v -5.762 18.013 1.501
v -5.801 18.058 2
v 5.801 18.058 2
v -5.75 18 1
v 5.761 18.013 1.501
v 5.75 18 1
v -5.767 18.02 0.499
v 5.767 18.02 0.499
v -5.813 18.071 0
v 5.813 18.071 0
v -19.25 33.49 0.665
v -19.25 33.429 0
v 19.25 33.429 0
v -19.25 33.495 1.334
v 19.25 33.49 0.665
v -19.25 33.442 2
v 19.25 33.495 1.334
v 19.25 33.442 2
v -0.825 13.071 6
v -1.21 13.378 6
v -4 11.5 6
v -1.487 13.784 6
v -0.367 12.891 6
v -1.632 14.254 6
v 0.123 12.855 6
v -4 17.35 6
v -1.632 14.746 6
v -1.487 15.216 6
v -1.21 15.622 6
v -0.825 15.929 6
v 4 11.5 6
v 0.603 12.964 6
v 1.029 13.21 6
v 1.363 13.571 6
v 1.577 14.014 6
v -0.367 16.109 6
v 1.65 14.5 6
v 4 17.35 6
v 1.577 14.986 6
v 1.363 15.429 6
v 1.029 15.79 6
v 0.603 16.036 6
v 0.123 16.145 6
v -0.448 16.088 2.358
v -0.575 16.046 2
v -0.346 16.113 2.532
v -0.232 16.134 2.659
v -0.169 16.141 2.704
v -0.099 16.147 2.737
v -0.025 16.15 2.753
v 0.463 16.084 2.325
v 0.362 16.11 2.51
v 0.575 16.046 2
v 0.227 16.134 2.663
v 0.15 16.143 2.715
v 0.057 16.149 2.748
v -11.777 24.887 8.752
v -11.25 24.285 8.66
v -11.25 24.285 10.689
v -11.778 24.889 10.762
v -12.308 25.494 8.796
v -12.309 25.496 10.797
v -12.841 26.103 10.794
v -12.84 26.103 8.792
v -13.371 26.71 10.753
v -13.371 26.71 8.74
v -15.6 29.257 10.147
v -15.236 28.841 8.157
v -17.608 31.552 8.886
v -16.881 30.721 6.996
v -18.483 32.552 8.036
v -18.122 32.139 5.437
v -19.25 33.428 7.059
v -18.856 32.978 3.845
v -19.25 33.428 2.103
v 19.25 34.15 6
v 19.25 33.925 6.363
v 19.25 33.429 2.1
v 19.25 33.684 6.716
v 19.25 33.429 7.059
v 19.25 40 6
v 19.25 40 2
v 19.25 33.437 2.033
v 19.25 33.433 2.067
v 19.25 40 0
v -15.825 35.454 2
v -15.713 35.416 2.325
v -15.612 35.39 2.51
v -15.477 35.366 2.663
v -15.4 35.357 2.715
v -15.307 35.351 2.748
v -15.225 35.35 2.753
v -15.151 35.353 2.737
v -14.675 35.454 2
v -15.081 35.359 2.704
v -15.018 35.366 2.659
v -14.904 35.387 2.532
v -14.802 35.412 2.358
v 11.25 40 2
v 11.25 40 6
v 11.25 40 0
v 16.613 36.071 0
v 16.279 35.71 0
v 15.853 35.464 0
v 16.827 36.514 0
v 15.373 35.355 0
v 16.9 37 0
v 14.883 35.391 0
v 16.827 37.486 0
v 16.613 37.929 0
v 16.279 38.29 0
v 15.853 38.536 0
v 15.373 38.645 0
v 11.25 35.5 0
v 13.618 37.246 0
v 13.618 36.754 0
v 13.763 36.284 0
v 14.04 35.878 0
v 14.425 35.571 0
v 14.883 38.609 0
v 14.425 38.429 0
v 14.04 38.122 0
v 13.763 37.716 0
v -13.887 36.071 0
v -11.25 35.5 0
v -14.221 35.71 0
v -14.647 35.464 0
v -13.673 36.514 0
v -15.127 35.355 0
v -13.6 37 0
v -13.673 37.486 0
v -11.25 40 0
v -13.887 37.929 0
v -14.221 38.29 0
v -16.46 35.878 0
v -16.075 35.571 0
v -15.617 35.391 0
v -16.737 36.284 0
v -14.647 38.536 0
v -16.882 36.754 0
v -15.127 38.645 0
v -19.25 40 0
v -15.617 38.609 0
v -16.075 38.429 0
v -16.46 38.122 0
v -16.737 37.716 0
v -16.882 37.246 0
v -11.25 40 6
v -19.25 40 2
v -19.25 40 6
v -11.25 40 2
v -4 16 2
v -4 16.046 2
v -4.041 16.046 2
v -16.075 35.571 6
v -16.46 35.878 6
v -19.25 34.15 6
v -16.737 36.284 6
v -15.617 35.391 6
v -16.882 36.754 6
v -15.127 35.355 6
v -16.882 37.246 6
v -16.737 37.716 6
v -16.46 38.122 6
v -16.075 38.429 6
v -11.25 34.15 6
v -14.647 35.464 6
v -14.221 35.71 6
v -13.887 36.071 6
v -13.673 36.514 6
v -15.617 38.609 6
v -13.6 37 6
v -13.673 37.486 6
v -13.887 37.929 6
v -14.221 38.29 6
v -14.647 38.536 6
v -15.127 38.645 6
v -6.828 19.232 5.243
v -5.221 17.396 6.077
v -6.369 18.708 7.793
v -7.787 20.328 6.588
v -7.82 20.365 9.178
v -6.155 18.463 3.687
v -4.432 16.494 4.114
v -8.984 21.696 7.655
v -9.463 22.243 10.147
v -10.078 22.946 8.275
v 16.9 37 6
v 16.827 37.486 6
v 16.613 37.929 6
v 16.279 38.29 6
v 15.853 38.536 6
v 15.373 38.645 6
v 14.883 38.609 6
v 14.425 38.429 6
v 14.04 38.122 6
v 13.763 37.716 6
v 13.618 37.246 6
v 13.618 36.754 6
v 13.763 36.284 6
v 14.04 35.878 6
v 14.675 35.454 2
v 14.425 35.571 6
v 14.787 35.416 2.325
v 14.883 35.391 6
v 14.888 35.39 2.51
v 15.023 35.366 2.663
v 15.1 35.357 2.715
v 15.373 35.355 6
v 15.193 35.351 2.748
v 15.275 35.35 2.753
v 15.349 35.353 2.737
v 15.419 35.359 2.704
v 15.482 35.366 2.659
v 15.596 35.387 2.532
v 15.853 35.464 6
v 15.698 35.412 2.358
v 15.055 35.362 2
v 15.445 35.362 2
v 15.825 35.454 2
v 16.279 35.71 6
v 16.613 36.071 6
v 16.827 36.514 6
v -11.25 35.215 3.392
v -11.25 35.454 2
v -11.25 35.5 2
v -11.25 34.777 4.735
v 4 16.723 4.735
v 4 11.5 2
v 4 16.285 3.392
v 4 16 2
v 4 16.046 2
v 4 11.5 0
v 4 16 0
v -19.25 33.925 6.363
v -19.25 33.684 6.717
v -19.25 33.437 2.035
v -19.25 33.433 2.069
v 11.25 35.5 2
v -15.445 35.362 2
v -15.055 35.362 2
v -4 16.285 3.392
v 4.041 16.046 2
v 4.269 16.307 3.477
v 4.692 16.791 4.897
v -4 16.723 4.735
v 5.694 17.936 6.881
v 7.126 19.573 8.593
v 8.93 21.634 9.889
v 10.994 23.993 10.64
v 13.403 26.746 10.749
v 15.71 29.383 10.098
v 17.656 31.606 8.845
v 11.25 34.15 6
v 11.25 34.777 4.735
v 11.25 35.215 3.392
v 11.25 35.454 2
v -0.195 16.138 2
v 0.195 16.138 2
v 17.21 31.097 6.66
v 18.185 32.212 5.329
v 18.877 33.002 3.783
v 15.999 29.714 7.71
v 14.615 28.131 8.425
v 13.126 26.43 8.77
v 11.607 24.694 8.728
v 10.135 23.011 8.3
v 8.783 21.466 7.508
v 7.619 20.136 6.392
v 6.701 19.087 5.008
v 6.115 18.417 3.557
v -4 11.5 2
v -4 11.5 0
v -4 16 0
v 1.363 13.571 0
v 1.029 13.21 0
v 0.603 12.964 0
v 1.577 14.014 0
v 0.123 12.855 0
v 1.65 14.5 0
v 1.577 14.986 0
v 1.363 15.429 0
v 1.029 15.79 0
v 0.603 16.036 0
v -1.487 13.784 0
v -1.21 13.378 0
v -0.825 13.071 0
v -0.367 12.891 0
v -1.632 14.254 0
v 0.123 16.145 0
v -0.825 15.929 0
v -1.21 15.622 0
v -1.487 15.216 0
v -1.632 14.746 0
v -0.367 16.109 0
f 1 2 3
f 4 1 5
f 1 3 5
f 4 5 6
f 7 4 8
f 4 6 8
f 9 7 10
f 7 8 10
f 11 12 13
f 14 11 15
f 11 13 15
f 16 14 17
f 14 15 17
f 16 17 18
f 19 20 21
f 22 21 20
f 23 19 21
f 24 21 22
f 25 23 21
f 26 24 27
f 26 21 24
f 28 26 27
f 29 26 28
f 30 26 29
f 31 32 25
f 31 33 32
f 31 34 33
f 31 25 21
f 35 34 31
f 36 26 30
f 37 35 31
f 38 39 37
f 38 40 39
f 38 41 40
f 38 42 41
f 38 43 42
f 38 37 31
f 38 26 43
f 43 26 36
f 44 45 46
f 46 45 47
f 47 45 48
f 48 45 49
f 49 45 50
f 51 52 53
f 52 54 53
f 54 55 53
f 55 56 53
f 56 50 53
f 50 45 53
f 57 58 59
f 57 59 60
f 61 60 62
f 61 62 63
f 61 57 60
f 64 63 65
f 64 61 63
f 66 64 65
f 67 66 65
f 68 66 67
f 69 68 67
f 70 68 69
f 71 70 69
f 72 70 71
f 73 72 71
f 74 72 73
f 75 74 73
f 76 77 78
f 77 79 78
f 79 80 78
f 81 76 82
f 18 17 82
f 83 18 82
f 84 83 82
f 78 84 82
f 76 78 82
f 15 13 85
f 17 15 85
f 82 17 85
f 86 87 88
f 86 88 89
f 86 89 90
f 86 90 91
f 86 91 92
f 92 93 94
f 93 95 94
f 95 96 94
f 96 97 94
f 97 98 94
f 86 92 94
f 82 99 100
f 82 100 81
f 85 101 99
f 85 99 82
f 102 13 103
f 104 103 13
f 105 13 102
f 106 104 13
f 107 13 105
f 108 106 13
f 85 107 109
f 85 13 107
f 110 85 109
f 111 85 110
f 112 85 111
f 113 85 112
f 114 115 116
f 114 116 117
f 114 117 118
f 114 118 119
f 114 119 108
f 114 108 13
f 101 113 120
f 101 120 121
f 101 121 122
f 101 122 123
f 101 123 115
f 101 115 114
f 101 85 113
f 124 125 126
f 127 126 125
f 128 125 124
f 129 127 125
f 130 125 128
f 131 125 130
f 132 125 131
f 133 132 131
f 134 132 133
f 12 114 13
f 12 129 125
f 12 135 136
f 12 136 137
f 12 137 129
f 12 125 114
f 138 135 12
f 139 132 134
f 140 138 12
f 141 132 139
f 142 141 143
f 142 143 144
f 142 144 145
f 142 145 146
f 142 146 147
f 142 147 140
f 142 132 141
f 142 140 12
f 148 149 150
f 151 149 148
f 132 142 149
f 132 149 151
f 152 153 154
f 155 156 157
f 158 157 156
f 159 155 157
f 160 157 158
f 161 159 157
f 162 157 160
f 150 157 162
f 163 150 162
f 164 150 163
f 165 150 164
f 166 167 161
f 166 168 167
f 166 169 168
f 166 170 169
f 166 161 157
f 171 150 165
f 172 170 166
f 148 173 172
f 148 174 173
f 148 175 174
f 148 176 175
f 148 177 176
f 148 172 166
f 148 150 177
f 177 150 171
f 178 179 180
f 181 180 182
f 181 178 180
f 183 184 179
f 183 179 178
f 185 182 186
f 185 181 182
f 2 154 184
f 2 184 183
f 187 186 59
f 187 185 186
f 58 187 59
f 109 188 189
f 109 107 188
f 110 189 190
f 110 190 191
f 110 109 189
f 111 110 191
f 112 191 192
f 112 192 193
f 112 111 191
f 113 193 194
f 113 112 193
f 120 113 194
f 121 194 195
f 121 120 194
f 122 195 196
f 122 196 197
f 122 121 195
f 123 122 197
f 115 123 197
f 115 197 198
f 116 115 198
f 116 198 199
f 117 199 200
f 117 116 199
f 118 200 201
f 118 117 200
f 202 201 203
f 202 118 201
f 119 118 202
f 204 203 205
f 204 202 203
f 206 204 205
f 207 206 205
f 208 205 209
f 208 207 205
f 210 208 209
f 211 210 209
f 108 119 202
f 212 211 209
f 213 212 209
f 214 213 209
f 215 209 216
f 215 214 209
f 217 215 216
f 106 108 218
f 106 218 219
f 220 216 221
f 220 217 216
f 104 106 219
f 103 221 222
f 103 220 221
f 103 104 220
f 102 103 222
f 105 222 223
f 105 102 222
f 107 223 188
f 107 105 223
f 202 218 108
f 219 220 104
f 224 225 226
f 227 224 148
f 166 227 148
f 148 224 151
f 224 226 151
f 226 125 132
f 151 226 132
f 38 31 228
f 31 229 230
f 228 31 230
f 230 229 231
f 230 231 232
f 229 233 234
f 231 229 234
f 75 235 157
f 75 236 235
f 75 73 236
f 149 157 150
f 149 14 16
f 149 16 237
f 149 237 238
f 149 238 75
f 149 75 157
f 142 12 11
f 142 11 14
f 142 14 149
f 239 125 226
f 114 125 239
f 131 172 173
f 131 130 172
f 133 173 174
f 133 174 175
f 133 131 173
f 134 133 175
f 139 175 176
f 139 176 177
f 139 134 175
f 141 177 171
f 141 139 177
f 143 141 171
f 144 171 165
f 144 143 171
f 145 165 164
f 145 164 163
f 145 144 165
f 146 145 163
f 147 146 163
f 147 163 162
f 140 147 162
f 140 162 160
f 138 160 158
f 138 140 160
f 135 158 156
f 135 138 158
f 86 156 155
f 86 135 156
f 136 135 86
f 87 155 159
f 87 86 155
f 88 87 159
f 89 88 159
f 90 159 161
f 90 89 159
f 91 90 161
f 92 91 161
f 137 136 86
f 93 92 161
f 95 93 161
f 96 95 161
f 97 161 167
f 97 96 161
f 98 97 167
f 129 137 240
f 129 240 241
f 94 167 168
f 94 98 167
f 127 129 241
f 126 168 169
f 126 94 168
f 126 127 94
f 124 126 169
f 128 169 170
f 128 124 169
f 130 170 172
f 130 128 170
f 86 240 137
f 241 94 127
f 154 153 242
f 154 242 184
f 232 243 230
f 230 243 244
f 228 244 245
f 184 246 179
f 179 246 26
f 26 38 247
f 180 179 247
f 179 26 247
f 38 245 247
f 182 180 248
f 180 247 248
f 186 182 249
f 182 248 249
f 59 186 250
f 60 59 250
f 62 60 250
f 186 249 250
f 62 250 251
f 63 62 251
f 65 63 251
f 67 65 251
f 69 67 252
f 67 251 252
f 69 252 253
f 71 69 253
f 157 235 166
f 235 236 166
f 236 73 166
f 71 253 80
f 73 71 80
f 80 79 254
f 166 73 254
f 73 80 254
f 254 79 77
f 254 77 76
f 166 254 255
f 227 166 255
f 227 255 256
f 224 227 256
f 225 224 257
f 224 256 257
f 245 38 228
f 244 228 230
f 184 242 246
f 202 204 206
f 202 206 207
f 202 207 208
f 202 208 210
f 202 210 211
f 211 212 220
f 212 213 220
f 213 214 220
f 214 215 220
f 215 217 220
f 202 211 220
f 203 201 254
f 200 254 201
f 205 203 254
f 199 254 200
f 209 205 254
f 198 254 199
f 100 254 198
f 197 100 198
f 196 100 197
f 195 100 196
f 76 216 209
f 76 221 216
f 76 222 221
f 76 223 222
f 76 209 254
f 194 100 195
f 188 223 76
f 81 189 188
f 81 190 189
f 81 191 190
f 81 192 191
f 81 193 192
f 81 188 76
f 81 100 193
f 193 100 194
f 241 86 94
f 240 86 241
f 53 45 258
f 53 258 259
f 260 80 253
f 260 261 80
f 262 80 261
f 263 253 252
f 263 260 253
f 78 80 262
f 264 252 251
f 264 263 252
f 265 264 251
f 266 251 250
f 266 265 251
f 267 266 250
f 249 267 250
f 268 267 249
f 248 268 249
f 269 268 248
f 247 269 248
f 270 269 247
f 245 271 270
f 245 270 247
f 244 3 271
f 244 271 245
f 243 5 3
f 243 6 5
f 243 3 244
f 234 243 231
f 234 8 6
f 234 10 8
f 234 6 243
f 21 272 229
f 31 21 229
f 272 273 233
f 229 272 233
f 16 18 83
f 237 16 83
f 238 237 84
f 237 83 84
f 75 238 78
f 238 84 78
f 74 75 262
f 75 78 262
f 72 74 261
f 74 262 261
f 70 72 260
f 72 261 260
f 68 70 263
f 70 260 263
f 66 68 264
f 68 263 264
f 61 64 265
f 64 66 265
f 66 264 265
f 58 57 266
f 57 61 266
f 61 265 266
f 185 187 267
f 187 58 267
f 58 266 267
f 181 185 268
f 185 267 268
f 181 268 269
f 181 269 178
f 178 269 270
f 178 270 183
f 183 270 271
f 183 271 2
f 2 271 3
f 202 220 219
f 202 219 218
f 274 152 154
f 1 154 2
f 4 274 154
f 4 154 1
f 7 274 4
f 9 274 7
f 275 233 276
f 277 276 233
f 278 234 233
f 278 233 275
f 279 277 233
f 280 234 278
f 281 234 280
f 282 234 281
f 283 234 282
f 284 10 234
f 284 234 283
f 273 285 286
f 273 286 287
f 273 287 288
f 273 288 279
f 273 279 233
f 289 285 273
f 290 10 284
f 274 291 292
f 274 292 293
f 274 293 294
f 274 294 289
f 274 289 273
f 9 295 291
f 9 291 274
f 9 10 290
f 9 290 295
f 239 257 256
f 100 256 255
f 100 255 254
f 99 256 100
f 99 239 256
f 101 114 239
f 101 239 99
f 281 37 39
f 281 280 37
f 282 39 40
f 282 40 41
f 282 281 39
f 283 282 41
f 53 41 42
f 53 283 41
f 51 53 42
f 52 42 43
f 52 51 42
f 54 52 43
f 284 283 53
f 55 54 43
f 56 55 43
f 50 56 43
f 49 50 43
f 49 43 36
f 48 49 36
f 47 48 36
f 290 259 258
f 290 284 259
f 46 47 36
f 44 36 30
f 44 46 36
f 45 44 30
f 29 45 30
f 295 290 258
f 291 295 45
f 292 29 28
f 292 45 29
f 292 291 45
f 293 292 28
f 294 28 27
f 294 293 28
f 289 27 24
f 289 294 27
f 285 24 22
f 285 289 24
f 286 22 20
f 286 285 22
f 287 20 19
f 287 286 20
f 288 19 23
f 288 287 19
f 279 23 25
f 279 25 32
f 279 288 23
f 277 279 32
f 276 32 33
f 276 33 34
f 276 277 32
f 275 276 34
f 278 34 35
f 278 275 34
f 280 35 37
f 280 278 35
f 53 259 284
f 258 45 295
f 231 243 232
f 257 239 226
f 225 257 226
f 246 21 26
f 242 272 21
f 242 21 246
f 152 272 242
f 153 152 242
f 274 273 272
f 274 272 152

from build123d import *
from build123d.topology import SkipClean

# Parameters (mm, degrees)
SKICA1_R                            = 1.650000859
SKICA1_R_2                          = 1.650000856
SKICA1_R_3                          = 1.649999795
P_IDAT_VYSUNUT_M1_DEPTH             = 2
P_IDAT_VYSUNUT_M3_REACH             = 52.341
P_IDAT_VYSUNUT_M3_DIRECTION_2_REACH = 52.341
SKICA3_R                            = 7.749999856
ODEBRAT_VYSUNUT_M1_DEPTH            = 50
SKICA5_W                            = 5.707521684
SKICA5_H                            = 11.749115372
SKICA5_W_2                          = 4.565648586
ODEBRAT_VYSUNUT_M2_DEPTH            = 100
SKICA6_W                            = 8.00000038
SKICA6_H                            = 6.259476141
SKICA6_R                            = 1.649999795
SKICA6_W_2                          = 7.999999449
SKICA6_H_2                          = 6.147887642
SKICA6_R_2                          = 1.650000859
SKICA6_R_3                          = 1.650000856
P_IDAT_VYSUNUT_M4_DEPTH             = 4


with BuildPart() as part:
    # Skica1 → Přidat vysunutím1 (new body)
    with BuildSketch(Plane.XY):
        Polygon((19.249999896, 35.500001162), (19.249999896, 33.428542316), (4.00000019, 16.00000076), (4.00000019, 11.500000022), (-4.00000019, 11.500000022), (-4.00000019, 16.00000076), (-19.249999896, 33.42806357), (-19.249999896, 35.500001162), (-19.249999896, 39.999999106), (-11.250000447, 39.999999106), (-11.250000447, 35.500001162), (11.250000447, 35.500001162), (11.250000447, 39.999999106), (19.249999896, 39.999999106), align=None)
        with Locations((-15.249999503, 37.000001471)):
            Circle(SKICA1_R, mode=Mode.SUBTRACT)
        with Locations((15.249998879, 37.000001475)):
            Circle(SKICA1_R_2, mode=Mode.SUBTRACT)
        with Locations((1.87e-07, 14.499999779)):
            Circle(SKICA1_R_3, mode=Mode.SUBTRACT)
    extrude(amount=P_IDAT_VYSUNUT_M1_DEPTH)

    # Přidat vysunutím3: up to this face of the body (flat: up to its plane)
    p_idat_vysunut_m3_end = Plane(part.part.faces().sort_by_distance((11.625000043, 24.714271538, 1))[0])
    # Skica2 → Přidat vysunutím3 (add, up to the picked face)
    with BuildSketch(Plane(origin=(-11.250000447, 0, 0), x_dir=(0, 0, -1), z_dir=(1, 0, 0)), mode=Mode.PRIVATE) as p_idat_vysunut_m3_sk1:
        with BuildLine():
            Line((-2, 35.453607186), (-2, 33.44155343))
            ThreePointArc((-2, 33.44155343), (-8.800000314, 25.749999709), (-2, 18.058445988))
            Line((-2, 18.058445988), (-2, 16.046392232))
            ThreePointArc((-2, 16.046392232), (-10.800000314, 25.749999709), (-2, 35.453607186))
        make_face()
    p_idat_vysunut_m3_tool1 = split(extrude(p_idat_vysunut_m3_sk1.sketch, amount=P_IDAT_VYSUNUT_M3_REACH, mode=Mode.PRIVATE), bisect_by=p_idat_vysunut_m3_end, keep=Keep.BOTH, mode=Mode.PRIVATE)
    add(p_idat_vysunut_m3_tool1.solids().sort_by(Axis((-11.25, 17.052419, 2.213092), (1, 0, 0)))[0])

    # Přidat vysunutím3 direction 2: up to this face of the body (flat: up to its plane)
    p_idat_vysunut_m3_direction_2_end = Plane(part.part.faces().sort_by_distance((-11.625000043, 24.714032165, 1))[0])
    # Skica2 → Přidat vysunutím3 direction 2 (add, up to the picked face)
    with BuildSketch(Plane(origin=(-11.250000447, 0, 0), x_dir=(0, 0, -1), z_dir=(1, 0, 0)), mode=Mode.PRIVATE) as p_idat_vysunut_m3_direction_2_sk1:
        with BuildLine():
            Line((-2, 35.453607186), (-2, 33.44155343))
            ThreePointArc((-2, 33.44155343), (-8.800000314, 25.749999709), (-2, 18.058445988))
            Line((-2, 18.058445988), (-2, 16.046392232))
            ThreePointArc((-2, 16.046392232), (-10.800000314, 25.749999709), (-2, 35.453607186))
        make_face()
    p_idat_vysunut_m3_direction_2_tool1 = split(extrude(p_idat_vysunut_m3_direction_2_sk1.sketch, amount=-P_IDAT_VYSUNUT_M3_DIRECTION_2_REACH, mode=Mode.PRIVATE), bisect_by=p_idat_vysunut_m3_direction_2_end, keep=Keep.BOTH, mode=Mode.PRIVATE)
    add(p_idat_vysunut_m3_direction_2_tool1.solids().sort_by(Axis((-11.25, 17.052419, 2.213092), (-1, 0, 0)))[0])

    # Skica3 → Odebrat vysunutím1 (cut, symmetric)
    with SkipClean():  # the faces are left unmerged after this step: merging them gives an invalid solid
        with BuildSketch(Plane(origin=(-11.250000447, 0, 0), x_dir=(0, 0, -1), z_dir=(1, 0, 0))):
            with Locations((-1.050000457, 25.749999709)):
                Circle(SKICA3_R)
        extrude(amount=ODEBRAT_VYSUNUT_M1_DEPTH, both=True, mode=Mode.SUBTRACT)

    # Skica5 → Odebrat vysunutím2 (cut)
    with BuildSketch(Plane(origin=(0, 0, 0), x_dir=(-1, 0, 0), z_dir=(0, 0, -1))):
        Polygon((4.00000019, 16.00000076), (13.371125893, 26.709546366), (13.371125893, 14.106664416), align=None)
        with Locations((22.103760738, 34.12544142)):
            Rectangle(SKICA5_W, SKICA5_H)
        with Locations((-21.532824189, 34.12544142)):
            Rectangle(SKICA5_W_2, SKICA5_H)
    extrude(amount=-ODEBRAT_VYSUNUT_M2_DEPTH, mode=Mode.SUBTRACT)

    # Skica6 → Přidat vysunutím4 (add)
    # profile 1 of 3: a face of its own
    with BuildSketch(Plane.XY.offset(2)):
        with Locations((0, 14.629738093)):
            Rectangle(SKICA6_W, SKICA6_H)
        with Locations((1.87e-07, 14.499999779)):
            Circle(SKICA6_R, mode=Mode.SUBTRACT)
    # profile 2 of 3: a face of its own
    with BuildSketch(Plane.XY.offset(2)):
        with Locations((-15.250000172, 36.926055285)):
            Rectangle(SKICA6_W_2, SKICA6_H_2)
        with Locations((-15.249999503, 37.000001471)):
            Circle(SKICA6_R_2, mode=Mode.SUBTRACT)
    # profile 3 of 3: a face of its own
    with BuildSketch(Plane.XY.offset(2)):
        with Locations((15.250000172, 36.926055285)):
            Rectangle(SKICA6_W_2, SKICA6_H_2)
        with Locations((15.249998879, 37.000001475)):
            Circle(SKICA6_R_3, mode=Mode.SUBTRACT)
    extrude(amount=P_IDAT_VYSUNUT_M4_DEPTH)


solid = part.part
